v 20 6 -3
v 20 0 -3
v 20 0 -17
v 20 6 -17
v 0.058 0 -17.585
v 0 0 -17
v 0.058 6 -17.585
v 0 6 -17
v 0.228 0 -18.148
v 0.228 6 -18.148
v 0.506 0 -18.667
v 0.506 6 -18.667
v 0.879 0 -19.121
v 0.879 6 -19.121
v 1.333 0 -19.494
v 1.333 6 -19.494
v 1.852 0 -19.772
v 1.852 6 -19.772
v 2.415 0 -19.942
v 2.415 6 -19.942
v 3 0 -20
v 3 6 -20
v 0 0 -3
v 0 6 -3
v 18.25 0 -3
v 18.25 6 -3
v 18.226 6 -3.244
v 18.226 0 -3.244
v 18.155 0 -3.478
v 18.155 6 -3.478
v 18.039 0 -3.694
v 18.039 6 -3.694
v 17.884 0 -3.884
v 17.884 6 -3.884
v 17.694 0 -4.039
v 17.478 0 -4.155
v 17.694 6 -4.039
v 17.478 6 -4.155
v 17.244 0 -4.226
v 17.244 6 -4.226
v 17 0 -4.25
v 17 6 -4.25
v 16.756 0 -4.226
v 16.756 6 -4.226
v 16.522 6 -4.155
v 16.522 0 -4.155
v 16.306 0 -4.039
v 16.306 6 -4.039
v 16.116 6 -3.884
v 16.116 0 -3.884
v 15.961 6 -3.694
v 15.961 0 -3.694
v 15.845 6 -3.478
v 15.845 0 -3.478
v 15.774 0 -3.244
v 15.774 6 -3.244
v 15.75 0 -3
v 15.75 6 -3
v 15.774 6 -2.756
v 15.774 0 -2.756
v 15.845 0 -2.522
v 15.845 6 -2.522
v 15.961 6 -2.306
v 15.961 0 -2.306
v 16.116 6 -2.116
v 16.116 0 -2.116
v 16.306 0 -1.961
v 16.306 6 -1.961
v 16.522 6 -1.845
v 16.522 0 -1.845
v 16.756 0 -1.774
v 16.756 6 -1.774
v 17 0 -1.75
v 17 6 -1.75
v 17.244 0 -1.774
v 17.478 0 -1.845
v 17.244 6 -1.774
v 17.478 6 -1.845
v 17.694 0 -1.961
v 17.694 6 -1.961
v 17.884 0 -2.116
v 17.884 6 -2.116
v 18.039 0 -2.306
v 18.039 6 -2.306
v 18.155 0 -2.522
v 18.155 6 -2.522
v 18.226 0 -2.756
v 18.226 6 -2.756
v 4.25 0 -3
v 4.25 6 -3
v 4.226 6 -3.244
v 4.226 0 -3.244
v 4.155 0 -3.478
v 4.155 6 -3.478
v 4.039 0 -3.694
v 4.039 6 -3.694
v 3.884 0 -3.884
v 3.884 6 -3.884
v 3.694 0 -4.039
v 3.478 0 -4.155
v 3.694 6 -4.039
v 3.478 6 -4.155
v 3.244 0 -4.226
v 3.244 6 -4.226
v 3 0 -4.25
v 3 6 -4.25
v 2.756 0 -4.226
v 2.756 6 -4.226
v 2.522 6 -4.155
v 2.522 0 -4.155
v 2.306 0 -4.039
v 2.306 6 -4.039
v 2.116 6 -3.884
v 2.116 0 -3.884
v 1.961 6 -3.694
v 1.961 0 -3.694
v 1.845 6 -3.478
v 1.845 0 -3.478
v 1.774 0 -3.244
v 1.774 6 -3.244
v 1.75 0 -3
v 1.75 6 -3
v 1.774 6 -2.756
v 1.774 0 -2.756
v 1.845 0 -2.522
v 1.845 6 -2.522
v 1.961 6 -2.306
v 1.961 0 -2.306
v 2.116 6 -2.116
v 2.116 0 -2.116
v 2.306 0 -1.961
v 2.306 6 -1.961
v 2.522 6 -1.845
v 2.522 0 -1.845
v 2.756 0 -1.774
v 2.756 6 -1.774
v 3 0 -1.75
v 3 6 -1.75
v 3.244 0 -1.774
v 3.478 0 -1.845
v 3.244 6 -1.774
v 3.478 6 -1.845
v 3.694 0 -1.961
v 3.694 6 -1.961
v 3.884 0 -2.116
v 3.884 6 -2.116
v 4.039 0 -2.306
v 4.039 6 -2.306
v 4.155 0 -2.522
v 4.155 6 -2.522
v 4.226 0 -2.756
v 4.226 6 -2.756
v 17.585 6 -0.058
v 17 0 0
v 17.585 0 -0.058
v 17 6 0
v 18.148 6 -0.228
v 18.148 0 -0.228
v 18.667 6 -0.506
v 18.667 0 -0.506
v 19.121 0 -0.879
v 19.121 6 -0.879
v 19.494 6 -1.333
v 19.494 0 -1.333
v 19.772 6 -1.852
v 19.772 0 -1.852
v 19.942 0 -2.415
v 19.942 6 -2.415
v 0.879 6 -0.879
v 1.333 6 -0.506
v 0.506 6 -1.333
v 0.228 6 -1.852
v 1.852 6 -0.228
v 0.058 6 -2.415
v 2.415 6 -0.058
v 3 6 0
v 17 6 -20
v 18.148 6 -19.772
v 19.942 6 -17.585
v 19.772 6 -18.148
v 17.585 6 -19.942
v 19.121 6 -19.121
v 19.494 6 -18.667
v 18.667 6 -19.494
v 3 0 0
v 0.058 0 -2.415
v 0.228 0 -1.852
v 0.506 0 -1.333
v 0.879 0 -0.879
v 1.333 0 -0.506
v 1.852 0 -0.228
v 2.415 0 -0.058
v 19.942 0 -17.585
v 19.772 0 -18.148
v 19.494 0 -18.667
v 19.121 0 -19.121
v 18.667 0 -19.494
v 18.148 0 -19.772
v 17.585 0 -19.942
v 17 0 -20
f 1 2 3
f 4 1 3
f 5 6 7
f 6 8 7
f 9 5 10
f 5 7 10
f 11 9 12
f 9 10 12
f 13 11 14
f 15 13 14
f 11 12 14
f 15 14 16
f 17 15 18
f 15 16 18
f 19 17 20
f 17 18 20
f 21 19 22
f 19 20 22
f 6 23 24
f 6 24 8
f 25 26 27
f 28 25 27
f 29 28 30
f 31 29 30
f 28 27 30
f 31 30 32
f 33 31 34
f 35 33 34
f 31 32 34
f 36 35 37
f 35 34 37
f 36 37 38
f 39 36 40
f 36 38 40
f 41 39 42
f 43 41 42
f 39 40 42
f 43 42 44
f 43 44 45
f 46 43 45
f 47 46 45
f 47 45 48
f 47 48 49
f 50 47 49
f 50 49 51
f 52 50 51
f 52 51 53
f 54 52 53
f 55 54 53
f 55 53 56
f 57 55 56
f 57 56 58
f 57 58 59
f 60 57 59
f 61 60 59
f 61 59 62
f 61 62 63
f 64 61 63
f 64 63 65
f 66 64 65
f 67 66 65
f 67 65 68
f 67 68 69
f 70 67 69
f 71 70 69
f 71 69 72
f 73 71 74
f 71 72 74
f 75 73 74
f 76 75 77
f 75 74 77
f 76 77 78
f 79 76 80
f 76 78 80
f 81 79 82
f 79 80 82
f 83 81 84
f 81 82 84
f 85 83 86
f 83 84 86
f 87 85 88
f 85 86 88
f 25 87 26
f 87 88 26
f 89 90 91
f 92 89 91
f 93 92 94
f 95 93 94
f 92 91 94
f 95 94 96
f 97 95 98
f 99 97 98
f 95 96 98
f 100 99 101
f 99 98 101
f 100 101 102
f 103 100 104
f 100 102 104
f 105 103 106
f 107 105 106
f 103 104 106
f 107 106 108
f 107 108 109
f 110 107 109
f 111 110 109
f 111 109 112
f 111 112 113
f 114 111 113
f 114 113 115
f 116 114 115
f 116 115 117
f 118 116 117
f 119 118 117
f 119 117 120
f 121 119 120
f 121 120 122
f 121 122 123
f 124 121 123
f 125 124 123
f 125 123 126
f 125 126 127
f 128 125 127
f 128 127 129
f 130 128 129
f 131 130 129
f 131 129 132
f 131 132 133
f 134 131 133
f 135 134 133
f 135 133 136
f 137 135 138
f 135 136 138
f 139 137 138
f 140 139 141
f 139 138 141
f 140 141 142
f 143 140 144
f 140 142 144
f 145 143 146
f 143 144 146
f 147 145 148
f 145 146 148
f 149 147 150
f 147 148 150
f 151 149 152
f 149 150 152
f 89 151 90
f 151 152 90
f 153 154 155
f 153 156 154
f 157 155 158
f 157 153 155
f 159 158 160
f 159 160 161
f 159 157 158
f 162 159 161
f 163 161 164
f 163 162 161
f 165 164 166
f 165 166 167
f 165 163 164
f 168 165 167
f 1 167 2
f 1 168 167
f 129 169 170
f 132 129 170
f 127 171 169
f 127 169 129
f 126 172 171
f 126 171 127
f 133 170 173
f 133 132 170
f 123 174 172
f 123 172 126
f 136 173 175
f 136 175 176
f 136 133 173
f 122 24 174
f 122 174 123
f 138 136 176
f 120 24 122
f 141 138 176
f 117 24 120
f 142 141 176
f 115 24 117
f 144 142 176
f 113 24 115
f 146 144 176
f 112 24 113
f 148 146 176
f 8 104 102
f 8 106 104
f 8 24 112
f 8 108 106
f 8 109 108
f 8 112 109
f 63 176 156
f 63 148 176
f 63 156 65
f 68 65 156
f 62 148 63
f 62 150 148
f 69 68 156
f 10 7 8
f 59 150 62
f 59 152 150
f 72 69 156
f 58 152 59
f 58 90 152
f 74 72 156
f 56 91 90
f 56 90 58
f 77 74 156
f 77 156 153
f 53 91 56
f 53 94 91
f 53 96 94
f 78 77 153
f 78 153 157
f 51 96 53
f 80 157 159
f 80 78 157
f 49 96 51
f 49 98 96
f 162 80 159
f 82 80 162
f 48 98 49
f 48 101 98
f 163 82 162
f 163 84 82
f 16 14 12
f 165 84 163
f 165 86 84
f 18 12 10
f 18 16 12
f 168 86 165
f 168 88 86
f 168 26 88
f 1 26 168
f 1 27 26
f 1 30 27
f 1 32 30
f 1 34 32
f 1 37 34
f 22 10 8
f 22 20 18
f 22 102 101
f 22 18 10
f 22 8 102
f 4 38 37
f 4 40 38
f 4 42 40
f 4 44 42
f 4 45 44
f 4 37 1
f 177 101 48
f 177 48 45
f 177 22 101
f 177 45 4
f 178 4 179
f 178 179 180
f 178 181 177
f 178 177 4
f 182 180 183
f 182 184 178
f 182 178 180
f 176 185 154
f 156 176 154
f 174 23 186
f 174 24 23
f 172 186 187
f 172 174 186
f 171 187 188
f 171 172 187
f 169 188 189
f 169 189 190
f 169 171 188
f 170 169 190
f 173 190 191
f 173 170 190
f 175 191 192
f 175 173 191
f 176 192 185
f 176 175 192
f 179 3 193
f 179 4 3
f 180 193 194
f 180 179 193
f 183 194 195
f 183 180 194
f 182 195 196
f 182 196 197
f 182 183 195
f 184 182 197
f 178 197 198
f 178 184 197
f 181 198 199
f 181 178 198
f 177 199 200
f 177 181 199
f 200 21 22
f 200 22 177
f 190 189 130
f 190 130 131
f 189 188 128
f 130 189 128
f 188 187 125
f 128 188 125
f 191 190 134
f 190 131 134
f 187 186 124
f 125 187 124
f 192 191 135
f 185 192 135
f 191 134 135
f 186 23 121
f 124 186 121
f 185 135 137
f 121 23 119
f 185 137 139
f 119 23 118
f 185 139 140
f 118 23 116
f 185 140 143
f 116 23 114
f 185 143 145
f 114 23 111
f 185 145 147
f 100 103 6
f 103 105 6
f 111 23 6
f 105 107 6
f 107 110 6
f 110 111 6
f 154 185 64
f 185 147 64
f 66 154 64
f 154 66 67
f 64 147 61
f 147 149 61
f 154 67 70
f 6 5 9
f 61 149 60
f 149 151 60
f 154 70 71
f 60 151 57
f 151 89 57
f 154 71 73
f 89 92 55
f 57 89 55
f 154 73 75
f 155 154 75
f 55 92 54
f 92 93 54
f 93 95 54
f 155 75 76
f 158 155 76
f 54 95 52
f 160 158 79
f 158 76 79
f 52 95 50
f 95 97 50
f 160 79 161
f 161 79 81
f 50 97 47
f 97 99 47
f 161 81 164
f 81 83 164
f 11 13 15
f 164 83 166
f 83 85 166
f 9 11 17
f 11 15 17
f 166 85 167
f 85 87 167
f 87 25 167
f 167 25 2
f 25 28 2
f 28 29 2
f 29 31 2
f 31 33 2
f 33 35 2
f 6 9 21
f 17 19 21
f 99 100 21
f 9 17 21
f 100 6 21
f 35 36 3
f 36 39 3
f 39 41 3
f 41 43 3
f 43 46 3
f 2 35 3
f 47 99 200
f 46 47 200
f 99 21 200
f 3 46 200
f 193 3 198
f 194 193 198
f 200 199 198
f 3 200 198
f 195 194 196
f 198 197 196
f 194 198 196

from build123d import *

# Parameters (mm, degrees)
SKETCH1_W               = 20
SKETCH1_H               = 20
BOSS_EXTRUDE1_DEPTH     = 6
FILLET1_R               = 3
SKETCH2_R               = 1.25
CUT_EXTRUDE1_DEPTH      = 1
CUT_EXTRUDE1_DEPTH_BACK = 7


with BuildPart() as part:
    # Sketch1 → Boss-Extrude1 (new body)
    with BuildSketch(Plane(origin=(0, 0, 0), x_dir=(1, 0, 0), z_dir=(0, 1, 0))):
        with Locations((10, 10)):
            Rectangle(SKETCH1_W, SKETCH1_H)
    extrude(amount=BOSS_EXTRUDE1_DEPTH)

    # Fillet1
    fillet1_edges = [part.edges().sort_by_distance(p)[0] for p in [
        (0, 3, -20),
        (20, 3, -20),
        (20, 3, 0),
        (0, 3, 0),
    ]]
    fillet(fillet1_edges, radius=FILLET1_R)

    # Sketch2 → Cut-Extrude1 (cut, two sides)
    with BuildSketch(Plane(origin=(0, 6, 0), x_dir=(1, 0, 0), z_dir=(0, 1, 0))) as cut_extrude1_sk:
        with Locations((3, 3)):
            Circle(SKETCH2_R)
        with Locations((17, 3)):
            Circle(SKETCH2_R)
    extrude(amount=CUT_EXTRUDE1_DEPTH, mode=Mode.SUBTRACT)
    extrude(cut_extrude1_sk.sketch, amount=-CUT_EXTRUDE1_DEPTH_BACK, mode=Mode.SUBTRACT)


solid = part.part
